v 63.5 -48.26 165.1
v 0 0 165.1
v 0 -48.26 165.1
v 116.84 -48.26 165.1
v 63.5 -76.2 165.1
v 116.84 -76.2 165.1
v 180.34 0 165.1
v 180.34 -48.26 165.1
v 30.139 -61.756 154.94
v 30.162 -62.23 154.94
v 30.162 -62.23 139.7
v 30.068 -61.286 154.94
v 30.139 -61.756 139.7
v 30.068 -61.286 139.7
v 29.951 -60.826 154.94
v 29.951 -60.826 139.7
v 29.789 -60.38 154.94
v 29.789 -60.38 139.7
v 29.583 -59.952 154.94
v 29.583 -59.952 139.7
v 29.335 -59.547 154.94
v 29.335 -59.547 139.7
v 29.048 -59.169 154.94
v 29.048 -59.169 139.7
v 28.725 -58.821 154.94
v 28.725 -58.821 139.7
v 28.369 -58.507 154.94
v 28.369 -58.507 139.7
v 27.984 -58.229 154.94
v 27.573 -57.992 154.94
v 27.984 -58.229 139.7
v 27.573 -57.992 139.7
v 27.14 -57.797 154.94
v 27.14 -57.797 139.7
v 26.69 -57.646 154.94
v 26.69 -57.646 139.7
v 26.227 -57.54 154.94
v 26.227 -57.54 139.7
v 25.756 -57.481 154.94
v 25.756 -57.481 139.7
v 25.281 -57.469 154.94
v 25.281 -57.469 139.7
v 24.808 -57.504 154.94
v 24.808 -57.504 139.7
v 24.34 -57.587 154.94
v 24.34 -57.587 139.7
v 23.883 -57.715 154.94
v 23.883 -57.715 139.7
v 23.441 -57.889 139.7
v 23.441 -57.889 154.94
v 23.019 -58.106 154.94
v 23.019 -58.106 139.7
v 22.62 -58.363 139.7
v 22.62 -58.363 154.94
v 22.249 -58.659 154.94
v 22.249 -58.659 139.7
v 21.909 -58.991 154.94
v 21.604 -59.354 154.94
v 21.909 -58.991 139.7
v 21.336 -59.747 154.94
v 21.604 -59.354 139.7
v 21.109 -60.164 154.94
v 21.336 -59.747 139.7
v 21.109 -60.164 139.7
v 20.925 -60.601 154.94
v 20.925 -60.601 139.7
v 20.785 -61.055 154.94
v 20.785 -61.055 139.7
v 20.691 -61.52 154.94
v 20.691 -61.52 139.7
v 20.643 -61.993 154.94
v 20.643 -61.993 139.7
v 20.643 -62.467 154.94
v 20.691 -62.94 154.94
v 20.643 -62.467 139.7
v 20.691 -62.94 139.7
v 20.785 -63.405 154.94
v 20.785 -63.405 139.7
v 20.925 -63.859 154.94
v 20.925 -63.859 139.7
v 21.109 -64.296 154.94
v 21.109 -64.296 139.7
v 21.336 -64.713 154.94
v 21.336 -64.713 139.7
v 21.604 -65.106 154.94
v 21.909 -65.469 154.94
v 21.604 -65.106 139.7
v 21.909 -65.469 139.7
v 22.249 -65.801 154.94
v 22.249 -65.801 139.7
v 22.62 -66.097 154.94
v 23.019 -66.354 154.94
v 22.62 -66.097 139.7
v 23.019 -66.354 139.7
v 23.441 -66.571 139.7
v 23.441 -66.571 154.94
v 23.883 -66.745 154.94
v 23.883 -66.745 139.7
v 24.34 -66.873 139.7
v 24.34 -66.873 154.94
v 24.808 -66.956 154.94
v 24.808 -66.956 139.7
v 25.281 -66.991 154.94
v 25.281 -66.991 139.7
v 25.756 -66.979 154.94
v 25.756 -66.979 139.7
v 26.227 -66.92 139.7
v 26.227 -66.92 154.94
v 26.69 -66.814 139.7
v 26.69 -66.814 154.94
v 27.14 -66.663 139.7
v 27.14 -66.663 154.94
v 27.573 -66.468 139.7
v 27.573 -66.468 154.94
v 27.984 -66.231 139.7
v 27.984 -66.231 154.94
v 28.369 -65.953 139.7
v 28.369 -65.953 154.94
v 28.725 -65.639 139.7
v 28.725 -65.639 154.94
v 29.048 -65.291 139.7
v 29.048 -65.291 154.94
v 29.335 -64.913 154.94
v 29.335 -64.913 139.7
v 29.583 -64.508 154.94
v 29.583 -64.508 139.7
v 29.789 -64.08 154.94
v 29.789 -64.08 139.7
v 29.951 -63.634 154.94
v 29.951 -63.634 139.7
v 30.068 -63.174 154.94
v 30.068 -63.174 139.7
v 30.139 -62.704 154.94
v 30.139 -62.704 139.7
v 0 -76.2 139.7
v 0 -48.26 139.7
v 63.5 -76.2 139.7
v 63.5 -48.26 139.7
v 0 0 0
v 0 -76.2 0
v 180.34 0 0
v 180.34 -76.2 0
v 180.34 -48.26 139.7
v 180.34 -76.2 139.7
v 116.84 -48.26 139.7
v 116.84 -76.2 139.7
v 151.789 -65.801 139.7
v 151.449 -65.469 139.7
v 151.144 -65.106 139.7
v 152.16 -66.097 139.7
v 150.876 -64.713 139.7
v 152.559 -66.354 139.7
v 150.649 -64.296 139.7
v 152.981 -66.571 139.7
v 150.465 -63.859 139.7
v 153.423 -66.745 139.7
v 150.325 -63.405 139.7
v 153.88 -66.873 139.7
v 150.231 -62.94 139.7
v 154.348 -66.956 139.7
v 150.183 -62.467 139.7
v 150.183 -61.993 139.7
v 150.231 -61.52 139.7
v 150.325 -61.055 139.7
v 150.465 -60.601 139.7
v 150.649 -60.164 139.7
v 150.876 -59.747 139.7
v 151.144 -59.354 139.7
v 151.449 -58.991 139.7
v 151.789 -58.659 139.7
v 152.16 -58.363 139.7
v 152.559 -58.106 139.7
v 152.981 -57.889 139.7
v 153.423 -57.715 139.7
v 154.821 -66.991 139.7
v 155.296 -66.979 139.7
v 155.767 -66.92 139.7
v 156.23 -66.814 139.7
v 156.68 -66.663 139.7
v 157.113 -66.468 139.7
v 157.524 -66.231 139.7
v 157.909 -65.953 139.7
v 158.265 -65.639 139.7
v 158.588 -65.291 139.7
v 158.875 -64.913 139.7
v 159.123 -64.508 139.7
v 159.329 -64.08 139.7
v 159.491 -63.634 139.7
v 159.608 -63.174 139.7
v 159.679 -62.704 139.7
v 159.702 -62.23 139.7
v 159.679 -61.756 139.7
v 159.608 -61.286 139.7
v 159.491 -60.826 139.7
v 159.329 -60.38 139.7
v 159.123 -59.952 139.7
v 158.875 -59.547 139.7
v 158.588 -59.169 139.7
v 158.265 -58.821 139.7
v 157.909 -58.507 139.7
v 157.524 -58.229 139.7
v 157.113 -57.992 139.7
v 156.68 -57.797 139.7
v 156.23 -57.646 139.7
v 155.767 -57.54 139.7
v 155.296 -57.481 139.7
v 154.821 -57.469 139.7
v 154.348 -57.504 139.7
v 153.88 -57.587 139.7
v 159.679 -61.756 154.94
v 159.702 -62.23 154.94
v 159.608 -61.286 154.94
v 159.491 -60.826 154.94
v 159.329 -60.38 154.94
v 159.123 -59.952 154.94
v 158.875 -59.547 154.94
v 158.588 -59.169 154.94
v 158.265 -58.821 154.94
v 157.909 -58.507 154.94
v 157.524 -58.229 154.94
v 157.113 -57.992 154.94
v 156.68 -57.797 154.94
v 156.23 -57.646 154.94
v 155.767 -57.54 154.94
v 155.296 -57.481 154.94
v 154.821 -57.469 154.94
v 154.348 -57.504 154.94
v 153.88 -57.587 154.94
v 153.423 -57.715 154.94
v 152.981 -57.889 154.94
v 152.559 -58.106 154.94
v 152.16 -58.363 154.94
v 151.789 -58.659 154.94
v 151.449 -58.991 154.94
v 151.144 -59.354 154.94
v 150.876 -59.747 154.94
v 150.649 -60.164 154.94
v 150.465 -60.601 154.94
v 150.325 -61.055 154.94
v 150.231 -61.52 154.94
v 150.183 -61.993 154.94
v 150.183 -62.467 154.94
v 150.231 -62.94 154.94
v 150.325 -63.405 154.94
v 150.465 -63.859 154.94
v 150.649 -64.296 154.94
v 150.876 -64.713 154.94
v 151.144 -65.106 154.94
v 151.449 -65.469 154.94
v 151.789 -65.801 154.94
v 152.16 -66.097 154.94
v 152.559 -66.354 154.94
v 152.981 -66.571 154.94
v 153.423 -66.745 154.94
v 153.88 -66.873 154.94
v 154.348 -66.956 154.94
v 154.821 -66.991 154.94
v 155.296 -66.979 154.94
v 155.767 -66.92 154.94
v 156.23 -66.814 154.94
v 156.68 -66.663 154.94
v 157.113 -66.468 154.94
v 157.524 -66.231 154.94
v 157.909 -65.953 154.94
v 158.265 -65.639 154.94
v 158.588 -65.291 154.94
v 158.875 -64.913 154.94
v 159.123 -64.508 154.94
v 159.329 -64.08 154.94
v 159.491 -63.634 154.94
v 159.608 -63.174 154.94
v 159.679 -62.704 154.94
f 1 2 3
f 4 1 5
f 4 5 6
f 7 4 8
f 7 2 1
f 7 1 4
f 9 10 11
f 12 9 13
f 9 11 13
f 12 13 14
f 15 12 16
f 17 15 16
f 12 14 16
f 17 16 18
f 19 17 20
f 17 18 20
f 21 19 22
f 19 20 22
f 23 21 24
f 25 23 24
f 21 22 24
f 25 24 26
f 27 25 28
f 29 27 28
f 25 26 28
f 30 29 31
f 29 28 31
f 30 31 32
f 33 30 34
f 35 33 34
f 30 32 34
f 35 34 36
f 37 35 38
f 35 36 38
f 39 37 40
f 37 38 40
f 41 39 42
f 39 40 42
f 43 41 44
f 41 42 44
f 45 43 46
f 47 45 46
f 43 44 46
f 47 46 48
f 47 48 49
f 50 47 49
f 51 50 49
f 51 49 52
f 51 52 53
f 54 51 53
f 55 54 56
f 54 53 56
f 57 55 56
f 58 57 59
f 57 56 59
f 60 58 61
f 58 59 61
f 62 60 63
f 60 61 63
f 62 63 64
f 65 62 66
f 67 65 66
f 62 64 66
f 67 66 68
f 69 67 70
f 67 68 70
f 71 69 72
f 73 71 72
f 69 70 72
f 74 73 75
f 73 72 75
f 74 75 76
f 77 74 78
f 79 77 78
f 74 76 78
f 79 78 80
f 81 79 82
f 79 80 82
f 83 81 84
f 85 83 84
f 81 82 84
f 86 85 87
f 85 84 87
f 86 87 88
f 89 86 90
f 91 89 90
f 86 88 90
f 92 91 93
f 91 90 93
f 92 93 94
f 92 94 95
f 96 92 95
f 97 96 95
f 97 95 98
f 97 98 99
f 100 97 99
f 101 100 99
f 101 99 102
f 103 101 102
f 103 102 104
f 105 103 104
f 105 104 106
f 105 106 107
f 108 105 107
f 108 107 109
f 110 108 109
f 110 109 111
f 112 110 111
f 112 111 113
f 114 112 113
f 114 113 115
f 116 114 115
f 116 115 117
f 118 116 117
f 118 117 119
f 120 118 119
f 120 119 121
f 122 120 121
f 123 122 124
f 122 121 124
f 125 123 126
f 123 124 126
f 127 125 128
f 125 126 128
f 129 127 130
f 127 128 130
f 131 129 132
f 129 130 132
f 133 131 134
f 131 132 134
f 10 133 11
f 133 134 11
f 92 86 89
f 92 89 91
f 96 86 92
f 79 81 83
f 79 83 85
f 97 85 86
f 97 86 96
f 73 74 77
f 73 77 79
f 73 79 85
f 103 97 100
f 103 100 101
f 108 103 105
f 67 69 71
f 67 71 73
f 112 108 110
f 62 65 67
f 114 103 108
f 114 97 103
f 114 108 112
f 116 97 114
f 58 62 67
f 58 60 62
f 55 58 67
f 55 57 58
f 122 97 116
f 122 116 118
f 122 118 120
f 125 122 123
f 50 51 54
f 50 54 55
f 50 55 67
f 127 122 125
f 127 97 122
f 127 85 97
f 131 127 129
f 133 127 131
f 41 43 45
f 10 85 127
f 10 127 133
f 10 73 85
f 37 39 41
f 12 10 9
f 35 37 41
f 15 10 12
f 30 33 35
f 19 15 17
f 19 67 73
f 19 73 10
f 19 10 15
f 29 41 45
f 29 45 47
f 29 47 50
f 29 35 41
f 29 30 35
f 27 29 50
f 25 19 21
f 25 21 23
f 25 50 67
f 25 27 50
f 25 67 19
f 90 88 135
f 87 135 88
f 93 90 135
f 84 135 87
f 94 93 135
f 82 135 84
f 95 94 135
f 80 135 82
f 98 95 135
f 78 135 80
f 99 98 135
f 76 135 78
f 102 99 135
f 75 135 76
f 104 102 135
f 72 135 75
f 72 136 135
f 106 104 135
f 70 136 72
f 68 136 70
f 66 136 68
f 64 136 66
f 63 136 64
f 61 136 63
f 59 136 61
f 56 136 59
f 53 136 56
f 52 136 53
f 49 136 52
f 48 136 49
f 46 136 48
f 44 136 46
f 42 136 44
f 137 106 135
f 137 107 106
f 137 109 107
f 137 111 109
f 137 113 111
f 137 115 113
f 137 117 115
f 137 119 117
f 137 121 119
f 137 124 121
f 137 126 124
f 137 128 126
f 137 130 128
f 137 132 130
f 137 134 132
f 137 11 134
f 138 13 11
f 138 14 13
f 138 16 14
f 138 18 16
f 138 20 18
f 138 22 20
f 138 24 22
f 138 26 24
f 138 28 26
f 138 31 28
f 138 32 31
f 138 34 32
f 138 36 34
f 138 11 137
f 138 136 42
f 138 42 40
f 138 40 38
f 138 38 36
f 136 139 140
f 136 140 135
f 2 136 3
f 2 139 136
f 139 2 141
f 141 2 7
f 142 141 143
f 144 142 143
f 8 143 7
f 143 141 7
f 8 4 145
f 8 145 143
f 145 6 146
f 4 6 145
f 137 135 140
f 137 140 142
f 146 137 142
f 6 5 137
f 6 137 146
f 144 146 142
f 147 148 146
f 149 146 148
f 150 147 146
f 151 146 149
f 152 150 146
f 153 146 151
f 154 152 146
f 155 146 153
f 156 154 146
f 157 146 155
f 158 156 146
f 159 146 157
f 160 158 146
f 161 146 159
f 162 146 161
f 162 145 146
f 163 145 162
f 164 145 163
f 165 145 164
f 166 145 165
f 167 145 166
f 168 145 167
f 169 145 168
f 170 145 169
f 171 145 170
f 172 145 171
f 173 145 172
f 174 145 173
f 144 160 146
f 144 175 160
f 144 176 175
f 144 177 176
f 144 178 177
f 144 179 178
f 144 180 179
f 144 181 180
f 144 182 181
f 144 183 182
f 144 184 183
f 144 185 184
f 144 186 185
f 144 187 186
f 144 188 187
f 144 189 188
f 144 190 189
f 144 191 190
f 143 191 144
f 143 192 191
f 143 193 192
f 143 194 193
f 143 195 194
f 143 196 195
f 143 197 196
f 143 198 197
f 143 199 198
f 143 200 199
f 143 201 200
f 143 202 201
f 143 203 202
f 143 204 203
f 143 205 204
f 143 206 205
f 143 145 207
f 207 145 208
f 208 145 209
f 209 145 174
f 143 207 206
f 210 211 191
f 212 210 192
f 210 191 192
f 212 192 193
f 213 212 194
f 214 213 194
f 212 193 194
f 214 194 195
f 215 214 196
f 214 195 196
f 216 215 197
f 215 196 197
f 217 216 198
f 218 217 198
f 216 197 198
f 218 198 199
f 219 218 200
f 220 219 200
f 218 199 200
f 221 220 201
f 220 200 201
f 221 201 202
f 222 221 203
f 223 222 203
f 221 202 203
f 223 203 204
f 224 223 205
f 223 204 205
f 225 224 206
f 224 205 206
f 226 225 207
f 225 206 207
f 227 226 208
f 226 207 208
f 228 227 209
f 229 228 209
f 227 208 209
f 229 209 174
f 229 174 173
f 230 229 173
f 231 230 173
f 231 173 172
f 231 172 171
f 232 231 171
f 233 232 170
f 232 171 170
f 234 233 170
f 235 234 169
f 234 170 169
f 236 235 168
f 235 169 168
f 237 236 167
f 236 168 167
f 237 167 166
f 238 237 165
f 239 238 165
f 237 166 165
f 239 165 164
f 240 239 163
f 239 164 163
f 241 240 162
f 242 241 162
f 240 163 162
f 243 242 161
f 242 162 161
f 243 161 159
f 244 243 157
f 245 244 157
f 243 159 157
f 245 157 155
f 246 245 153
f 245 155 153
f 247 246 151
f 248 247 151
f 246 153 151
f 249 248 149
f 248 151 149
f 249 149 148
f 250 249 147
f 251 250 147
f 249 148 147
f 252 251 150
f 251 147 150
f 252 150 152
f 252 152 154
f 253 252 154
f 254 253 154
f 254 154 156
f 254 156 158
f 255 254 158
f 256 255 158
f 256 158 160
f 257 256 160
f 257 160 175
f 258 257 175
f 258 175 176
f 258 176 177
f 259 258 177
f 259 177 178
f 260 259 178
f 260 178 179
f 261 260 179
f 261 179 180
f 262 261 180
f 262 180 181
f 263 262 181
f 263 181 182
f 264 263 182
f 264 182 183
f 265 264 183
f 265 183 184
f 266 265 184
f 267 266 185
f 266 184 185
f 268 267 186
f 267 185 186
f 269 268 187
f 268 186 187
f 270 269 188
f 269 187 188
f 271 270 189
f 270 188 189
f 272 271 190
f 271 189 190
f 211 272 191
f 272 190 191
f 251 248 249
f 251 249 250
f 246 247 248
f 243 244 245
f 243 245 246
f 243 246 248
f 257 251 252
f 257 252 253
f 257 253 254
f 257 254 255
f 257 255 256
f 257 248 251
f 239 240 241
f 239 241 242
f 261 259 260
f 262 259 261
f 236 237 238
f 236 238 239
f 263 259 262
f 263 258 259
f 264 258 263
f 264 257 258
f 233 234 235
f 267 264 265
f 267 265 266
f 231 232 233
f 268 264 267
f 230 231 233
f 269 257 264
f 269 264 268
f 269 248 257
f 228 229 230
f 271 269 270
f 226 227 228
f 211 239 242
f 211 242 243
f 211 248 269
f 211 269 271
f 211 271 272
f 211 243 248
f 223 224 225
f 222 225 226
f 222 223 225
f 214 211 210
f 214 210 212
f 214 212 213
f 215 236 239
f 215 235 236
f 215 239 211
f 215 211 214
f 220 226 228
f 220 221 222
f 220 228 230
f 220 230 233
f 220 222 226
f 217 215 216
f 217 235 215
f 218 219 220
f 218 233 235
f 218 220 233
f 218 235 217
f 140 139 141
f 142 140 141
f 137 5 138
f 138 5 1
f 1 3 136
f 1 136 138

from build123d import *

# Parameters (mm, degrees)
F0_W      = 180.34
F0_H      = 165.1
F1_DEPTH  = 76.2
F2_W      = 63.5
F2_H      = 27.94
F3_DEPTH  = 25.4
F5_W      = 63.5
F5_H      = 27.94
F6_DEPTH  = 25.4
F7_R      = 4.7625
F8_DEPTH  = 15.24
F9_R      = 4.7625
F10_DEPTH = 15.24


with BuildPart() as f1:
    # F0 (on Front) → F1 (new body)
    with BuildSketch(Plane.XZ):
        with Locations((90.17, 82.55)):
            Rectangle(F0_W, F0_H)
    extrude(amount=F1_DEPTH)

    # F2 (on face) → F3 (cut)
    with BuildSketch(Plane.XY.offset(165.1)):
        with Locations((31.75, -62.23)):
            Rectangle(F2_W, F2_H)
    extrude(amount=-F3_DEPTH, mode=Mode.SUBTRACT)

    # F5 (on face) → F6 (cut)
    with BuildSketch(Plane.XY.offset(165.1)):
        with Locations((148.59, -62.23)):
            Rectangle(F5_W, F5_H)
    extrude(amount=-F6_DEPTH, mode=Mode.SUBTRACT)

    # F7 (on face) → F8 (join)
    with BuildSketch(Plane.XY.offset(139.7)):
        with Locations((25.4, -62.23)):
            Circle(F7_R)
    extrude(amount=F8_DEPTH)

    # F9 (on face) → F10 (join)
    with BuildSketch(Plane.XY.offset(139.7)):
        with Locations((154.94, -62.23)):
            Circle(F9_R)
    extrude(amount=F10_DEPTH)


solid = f1.part
